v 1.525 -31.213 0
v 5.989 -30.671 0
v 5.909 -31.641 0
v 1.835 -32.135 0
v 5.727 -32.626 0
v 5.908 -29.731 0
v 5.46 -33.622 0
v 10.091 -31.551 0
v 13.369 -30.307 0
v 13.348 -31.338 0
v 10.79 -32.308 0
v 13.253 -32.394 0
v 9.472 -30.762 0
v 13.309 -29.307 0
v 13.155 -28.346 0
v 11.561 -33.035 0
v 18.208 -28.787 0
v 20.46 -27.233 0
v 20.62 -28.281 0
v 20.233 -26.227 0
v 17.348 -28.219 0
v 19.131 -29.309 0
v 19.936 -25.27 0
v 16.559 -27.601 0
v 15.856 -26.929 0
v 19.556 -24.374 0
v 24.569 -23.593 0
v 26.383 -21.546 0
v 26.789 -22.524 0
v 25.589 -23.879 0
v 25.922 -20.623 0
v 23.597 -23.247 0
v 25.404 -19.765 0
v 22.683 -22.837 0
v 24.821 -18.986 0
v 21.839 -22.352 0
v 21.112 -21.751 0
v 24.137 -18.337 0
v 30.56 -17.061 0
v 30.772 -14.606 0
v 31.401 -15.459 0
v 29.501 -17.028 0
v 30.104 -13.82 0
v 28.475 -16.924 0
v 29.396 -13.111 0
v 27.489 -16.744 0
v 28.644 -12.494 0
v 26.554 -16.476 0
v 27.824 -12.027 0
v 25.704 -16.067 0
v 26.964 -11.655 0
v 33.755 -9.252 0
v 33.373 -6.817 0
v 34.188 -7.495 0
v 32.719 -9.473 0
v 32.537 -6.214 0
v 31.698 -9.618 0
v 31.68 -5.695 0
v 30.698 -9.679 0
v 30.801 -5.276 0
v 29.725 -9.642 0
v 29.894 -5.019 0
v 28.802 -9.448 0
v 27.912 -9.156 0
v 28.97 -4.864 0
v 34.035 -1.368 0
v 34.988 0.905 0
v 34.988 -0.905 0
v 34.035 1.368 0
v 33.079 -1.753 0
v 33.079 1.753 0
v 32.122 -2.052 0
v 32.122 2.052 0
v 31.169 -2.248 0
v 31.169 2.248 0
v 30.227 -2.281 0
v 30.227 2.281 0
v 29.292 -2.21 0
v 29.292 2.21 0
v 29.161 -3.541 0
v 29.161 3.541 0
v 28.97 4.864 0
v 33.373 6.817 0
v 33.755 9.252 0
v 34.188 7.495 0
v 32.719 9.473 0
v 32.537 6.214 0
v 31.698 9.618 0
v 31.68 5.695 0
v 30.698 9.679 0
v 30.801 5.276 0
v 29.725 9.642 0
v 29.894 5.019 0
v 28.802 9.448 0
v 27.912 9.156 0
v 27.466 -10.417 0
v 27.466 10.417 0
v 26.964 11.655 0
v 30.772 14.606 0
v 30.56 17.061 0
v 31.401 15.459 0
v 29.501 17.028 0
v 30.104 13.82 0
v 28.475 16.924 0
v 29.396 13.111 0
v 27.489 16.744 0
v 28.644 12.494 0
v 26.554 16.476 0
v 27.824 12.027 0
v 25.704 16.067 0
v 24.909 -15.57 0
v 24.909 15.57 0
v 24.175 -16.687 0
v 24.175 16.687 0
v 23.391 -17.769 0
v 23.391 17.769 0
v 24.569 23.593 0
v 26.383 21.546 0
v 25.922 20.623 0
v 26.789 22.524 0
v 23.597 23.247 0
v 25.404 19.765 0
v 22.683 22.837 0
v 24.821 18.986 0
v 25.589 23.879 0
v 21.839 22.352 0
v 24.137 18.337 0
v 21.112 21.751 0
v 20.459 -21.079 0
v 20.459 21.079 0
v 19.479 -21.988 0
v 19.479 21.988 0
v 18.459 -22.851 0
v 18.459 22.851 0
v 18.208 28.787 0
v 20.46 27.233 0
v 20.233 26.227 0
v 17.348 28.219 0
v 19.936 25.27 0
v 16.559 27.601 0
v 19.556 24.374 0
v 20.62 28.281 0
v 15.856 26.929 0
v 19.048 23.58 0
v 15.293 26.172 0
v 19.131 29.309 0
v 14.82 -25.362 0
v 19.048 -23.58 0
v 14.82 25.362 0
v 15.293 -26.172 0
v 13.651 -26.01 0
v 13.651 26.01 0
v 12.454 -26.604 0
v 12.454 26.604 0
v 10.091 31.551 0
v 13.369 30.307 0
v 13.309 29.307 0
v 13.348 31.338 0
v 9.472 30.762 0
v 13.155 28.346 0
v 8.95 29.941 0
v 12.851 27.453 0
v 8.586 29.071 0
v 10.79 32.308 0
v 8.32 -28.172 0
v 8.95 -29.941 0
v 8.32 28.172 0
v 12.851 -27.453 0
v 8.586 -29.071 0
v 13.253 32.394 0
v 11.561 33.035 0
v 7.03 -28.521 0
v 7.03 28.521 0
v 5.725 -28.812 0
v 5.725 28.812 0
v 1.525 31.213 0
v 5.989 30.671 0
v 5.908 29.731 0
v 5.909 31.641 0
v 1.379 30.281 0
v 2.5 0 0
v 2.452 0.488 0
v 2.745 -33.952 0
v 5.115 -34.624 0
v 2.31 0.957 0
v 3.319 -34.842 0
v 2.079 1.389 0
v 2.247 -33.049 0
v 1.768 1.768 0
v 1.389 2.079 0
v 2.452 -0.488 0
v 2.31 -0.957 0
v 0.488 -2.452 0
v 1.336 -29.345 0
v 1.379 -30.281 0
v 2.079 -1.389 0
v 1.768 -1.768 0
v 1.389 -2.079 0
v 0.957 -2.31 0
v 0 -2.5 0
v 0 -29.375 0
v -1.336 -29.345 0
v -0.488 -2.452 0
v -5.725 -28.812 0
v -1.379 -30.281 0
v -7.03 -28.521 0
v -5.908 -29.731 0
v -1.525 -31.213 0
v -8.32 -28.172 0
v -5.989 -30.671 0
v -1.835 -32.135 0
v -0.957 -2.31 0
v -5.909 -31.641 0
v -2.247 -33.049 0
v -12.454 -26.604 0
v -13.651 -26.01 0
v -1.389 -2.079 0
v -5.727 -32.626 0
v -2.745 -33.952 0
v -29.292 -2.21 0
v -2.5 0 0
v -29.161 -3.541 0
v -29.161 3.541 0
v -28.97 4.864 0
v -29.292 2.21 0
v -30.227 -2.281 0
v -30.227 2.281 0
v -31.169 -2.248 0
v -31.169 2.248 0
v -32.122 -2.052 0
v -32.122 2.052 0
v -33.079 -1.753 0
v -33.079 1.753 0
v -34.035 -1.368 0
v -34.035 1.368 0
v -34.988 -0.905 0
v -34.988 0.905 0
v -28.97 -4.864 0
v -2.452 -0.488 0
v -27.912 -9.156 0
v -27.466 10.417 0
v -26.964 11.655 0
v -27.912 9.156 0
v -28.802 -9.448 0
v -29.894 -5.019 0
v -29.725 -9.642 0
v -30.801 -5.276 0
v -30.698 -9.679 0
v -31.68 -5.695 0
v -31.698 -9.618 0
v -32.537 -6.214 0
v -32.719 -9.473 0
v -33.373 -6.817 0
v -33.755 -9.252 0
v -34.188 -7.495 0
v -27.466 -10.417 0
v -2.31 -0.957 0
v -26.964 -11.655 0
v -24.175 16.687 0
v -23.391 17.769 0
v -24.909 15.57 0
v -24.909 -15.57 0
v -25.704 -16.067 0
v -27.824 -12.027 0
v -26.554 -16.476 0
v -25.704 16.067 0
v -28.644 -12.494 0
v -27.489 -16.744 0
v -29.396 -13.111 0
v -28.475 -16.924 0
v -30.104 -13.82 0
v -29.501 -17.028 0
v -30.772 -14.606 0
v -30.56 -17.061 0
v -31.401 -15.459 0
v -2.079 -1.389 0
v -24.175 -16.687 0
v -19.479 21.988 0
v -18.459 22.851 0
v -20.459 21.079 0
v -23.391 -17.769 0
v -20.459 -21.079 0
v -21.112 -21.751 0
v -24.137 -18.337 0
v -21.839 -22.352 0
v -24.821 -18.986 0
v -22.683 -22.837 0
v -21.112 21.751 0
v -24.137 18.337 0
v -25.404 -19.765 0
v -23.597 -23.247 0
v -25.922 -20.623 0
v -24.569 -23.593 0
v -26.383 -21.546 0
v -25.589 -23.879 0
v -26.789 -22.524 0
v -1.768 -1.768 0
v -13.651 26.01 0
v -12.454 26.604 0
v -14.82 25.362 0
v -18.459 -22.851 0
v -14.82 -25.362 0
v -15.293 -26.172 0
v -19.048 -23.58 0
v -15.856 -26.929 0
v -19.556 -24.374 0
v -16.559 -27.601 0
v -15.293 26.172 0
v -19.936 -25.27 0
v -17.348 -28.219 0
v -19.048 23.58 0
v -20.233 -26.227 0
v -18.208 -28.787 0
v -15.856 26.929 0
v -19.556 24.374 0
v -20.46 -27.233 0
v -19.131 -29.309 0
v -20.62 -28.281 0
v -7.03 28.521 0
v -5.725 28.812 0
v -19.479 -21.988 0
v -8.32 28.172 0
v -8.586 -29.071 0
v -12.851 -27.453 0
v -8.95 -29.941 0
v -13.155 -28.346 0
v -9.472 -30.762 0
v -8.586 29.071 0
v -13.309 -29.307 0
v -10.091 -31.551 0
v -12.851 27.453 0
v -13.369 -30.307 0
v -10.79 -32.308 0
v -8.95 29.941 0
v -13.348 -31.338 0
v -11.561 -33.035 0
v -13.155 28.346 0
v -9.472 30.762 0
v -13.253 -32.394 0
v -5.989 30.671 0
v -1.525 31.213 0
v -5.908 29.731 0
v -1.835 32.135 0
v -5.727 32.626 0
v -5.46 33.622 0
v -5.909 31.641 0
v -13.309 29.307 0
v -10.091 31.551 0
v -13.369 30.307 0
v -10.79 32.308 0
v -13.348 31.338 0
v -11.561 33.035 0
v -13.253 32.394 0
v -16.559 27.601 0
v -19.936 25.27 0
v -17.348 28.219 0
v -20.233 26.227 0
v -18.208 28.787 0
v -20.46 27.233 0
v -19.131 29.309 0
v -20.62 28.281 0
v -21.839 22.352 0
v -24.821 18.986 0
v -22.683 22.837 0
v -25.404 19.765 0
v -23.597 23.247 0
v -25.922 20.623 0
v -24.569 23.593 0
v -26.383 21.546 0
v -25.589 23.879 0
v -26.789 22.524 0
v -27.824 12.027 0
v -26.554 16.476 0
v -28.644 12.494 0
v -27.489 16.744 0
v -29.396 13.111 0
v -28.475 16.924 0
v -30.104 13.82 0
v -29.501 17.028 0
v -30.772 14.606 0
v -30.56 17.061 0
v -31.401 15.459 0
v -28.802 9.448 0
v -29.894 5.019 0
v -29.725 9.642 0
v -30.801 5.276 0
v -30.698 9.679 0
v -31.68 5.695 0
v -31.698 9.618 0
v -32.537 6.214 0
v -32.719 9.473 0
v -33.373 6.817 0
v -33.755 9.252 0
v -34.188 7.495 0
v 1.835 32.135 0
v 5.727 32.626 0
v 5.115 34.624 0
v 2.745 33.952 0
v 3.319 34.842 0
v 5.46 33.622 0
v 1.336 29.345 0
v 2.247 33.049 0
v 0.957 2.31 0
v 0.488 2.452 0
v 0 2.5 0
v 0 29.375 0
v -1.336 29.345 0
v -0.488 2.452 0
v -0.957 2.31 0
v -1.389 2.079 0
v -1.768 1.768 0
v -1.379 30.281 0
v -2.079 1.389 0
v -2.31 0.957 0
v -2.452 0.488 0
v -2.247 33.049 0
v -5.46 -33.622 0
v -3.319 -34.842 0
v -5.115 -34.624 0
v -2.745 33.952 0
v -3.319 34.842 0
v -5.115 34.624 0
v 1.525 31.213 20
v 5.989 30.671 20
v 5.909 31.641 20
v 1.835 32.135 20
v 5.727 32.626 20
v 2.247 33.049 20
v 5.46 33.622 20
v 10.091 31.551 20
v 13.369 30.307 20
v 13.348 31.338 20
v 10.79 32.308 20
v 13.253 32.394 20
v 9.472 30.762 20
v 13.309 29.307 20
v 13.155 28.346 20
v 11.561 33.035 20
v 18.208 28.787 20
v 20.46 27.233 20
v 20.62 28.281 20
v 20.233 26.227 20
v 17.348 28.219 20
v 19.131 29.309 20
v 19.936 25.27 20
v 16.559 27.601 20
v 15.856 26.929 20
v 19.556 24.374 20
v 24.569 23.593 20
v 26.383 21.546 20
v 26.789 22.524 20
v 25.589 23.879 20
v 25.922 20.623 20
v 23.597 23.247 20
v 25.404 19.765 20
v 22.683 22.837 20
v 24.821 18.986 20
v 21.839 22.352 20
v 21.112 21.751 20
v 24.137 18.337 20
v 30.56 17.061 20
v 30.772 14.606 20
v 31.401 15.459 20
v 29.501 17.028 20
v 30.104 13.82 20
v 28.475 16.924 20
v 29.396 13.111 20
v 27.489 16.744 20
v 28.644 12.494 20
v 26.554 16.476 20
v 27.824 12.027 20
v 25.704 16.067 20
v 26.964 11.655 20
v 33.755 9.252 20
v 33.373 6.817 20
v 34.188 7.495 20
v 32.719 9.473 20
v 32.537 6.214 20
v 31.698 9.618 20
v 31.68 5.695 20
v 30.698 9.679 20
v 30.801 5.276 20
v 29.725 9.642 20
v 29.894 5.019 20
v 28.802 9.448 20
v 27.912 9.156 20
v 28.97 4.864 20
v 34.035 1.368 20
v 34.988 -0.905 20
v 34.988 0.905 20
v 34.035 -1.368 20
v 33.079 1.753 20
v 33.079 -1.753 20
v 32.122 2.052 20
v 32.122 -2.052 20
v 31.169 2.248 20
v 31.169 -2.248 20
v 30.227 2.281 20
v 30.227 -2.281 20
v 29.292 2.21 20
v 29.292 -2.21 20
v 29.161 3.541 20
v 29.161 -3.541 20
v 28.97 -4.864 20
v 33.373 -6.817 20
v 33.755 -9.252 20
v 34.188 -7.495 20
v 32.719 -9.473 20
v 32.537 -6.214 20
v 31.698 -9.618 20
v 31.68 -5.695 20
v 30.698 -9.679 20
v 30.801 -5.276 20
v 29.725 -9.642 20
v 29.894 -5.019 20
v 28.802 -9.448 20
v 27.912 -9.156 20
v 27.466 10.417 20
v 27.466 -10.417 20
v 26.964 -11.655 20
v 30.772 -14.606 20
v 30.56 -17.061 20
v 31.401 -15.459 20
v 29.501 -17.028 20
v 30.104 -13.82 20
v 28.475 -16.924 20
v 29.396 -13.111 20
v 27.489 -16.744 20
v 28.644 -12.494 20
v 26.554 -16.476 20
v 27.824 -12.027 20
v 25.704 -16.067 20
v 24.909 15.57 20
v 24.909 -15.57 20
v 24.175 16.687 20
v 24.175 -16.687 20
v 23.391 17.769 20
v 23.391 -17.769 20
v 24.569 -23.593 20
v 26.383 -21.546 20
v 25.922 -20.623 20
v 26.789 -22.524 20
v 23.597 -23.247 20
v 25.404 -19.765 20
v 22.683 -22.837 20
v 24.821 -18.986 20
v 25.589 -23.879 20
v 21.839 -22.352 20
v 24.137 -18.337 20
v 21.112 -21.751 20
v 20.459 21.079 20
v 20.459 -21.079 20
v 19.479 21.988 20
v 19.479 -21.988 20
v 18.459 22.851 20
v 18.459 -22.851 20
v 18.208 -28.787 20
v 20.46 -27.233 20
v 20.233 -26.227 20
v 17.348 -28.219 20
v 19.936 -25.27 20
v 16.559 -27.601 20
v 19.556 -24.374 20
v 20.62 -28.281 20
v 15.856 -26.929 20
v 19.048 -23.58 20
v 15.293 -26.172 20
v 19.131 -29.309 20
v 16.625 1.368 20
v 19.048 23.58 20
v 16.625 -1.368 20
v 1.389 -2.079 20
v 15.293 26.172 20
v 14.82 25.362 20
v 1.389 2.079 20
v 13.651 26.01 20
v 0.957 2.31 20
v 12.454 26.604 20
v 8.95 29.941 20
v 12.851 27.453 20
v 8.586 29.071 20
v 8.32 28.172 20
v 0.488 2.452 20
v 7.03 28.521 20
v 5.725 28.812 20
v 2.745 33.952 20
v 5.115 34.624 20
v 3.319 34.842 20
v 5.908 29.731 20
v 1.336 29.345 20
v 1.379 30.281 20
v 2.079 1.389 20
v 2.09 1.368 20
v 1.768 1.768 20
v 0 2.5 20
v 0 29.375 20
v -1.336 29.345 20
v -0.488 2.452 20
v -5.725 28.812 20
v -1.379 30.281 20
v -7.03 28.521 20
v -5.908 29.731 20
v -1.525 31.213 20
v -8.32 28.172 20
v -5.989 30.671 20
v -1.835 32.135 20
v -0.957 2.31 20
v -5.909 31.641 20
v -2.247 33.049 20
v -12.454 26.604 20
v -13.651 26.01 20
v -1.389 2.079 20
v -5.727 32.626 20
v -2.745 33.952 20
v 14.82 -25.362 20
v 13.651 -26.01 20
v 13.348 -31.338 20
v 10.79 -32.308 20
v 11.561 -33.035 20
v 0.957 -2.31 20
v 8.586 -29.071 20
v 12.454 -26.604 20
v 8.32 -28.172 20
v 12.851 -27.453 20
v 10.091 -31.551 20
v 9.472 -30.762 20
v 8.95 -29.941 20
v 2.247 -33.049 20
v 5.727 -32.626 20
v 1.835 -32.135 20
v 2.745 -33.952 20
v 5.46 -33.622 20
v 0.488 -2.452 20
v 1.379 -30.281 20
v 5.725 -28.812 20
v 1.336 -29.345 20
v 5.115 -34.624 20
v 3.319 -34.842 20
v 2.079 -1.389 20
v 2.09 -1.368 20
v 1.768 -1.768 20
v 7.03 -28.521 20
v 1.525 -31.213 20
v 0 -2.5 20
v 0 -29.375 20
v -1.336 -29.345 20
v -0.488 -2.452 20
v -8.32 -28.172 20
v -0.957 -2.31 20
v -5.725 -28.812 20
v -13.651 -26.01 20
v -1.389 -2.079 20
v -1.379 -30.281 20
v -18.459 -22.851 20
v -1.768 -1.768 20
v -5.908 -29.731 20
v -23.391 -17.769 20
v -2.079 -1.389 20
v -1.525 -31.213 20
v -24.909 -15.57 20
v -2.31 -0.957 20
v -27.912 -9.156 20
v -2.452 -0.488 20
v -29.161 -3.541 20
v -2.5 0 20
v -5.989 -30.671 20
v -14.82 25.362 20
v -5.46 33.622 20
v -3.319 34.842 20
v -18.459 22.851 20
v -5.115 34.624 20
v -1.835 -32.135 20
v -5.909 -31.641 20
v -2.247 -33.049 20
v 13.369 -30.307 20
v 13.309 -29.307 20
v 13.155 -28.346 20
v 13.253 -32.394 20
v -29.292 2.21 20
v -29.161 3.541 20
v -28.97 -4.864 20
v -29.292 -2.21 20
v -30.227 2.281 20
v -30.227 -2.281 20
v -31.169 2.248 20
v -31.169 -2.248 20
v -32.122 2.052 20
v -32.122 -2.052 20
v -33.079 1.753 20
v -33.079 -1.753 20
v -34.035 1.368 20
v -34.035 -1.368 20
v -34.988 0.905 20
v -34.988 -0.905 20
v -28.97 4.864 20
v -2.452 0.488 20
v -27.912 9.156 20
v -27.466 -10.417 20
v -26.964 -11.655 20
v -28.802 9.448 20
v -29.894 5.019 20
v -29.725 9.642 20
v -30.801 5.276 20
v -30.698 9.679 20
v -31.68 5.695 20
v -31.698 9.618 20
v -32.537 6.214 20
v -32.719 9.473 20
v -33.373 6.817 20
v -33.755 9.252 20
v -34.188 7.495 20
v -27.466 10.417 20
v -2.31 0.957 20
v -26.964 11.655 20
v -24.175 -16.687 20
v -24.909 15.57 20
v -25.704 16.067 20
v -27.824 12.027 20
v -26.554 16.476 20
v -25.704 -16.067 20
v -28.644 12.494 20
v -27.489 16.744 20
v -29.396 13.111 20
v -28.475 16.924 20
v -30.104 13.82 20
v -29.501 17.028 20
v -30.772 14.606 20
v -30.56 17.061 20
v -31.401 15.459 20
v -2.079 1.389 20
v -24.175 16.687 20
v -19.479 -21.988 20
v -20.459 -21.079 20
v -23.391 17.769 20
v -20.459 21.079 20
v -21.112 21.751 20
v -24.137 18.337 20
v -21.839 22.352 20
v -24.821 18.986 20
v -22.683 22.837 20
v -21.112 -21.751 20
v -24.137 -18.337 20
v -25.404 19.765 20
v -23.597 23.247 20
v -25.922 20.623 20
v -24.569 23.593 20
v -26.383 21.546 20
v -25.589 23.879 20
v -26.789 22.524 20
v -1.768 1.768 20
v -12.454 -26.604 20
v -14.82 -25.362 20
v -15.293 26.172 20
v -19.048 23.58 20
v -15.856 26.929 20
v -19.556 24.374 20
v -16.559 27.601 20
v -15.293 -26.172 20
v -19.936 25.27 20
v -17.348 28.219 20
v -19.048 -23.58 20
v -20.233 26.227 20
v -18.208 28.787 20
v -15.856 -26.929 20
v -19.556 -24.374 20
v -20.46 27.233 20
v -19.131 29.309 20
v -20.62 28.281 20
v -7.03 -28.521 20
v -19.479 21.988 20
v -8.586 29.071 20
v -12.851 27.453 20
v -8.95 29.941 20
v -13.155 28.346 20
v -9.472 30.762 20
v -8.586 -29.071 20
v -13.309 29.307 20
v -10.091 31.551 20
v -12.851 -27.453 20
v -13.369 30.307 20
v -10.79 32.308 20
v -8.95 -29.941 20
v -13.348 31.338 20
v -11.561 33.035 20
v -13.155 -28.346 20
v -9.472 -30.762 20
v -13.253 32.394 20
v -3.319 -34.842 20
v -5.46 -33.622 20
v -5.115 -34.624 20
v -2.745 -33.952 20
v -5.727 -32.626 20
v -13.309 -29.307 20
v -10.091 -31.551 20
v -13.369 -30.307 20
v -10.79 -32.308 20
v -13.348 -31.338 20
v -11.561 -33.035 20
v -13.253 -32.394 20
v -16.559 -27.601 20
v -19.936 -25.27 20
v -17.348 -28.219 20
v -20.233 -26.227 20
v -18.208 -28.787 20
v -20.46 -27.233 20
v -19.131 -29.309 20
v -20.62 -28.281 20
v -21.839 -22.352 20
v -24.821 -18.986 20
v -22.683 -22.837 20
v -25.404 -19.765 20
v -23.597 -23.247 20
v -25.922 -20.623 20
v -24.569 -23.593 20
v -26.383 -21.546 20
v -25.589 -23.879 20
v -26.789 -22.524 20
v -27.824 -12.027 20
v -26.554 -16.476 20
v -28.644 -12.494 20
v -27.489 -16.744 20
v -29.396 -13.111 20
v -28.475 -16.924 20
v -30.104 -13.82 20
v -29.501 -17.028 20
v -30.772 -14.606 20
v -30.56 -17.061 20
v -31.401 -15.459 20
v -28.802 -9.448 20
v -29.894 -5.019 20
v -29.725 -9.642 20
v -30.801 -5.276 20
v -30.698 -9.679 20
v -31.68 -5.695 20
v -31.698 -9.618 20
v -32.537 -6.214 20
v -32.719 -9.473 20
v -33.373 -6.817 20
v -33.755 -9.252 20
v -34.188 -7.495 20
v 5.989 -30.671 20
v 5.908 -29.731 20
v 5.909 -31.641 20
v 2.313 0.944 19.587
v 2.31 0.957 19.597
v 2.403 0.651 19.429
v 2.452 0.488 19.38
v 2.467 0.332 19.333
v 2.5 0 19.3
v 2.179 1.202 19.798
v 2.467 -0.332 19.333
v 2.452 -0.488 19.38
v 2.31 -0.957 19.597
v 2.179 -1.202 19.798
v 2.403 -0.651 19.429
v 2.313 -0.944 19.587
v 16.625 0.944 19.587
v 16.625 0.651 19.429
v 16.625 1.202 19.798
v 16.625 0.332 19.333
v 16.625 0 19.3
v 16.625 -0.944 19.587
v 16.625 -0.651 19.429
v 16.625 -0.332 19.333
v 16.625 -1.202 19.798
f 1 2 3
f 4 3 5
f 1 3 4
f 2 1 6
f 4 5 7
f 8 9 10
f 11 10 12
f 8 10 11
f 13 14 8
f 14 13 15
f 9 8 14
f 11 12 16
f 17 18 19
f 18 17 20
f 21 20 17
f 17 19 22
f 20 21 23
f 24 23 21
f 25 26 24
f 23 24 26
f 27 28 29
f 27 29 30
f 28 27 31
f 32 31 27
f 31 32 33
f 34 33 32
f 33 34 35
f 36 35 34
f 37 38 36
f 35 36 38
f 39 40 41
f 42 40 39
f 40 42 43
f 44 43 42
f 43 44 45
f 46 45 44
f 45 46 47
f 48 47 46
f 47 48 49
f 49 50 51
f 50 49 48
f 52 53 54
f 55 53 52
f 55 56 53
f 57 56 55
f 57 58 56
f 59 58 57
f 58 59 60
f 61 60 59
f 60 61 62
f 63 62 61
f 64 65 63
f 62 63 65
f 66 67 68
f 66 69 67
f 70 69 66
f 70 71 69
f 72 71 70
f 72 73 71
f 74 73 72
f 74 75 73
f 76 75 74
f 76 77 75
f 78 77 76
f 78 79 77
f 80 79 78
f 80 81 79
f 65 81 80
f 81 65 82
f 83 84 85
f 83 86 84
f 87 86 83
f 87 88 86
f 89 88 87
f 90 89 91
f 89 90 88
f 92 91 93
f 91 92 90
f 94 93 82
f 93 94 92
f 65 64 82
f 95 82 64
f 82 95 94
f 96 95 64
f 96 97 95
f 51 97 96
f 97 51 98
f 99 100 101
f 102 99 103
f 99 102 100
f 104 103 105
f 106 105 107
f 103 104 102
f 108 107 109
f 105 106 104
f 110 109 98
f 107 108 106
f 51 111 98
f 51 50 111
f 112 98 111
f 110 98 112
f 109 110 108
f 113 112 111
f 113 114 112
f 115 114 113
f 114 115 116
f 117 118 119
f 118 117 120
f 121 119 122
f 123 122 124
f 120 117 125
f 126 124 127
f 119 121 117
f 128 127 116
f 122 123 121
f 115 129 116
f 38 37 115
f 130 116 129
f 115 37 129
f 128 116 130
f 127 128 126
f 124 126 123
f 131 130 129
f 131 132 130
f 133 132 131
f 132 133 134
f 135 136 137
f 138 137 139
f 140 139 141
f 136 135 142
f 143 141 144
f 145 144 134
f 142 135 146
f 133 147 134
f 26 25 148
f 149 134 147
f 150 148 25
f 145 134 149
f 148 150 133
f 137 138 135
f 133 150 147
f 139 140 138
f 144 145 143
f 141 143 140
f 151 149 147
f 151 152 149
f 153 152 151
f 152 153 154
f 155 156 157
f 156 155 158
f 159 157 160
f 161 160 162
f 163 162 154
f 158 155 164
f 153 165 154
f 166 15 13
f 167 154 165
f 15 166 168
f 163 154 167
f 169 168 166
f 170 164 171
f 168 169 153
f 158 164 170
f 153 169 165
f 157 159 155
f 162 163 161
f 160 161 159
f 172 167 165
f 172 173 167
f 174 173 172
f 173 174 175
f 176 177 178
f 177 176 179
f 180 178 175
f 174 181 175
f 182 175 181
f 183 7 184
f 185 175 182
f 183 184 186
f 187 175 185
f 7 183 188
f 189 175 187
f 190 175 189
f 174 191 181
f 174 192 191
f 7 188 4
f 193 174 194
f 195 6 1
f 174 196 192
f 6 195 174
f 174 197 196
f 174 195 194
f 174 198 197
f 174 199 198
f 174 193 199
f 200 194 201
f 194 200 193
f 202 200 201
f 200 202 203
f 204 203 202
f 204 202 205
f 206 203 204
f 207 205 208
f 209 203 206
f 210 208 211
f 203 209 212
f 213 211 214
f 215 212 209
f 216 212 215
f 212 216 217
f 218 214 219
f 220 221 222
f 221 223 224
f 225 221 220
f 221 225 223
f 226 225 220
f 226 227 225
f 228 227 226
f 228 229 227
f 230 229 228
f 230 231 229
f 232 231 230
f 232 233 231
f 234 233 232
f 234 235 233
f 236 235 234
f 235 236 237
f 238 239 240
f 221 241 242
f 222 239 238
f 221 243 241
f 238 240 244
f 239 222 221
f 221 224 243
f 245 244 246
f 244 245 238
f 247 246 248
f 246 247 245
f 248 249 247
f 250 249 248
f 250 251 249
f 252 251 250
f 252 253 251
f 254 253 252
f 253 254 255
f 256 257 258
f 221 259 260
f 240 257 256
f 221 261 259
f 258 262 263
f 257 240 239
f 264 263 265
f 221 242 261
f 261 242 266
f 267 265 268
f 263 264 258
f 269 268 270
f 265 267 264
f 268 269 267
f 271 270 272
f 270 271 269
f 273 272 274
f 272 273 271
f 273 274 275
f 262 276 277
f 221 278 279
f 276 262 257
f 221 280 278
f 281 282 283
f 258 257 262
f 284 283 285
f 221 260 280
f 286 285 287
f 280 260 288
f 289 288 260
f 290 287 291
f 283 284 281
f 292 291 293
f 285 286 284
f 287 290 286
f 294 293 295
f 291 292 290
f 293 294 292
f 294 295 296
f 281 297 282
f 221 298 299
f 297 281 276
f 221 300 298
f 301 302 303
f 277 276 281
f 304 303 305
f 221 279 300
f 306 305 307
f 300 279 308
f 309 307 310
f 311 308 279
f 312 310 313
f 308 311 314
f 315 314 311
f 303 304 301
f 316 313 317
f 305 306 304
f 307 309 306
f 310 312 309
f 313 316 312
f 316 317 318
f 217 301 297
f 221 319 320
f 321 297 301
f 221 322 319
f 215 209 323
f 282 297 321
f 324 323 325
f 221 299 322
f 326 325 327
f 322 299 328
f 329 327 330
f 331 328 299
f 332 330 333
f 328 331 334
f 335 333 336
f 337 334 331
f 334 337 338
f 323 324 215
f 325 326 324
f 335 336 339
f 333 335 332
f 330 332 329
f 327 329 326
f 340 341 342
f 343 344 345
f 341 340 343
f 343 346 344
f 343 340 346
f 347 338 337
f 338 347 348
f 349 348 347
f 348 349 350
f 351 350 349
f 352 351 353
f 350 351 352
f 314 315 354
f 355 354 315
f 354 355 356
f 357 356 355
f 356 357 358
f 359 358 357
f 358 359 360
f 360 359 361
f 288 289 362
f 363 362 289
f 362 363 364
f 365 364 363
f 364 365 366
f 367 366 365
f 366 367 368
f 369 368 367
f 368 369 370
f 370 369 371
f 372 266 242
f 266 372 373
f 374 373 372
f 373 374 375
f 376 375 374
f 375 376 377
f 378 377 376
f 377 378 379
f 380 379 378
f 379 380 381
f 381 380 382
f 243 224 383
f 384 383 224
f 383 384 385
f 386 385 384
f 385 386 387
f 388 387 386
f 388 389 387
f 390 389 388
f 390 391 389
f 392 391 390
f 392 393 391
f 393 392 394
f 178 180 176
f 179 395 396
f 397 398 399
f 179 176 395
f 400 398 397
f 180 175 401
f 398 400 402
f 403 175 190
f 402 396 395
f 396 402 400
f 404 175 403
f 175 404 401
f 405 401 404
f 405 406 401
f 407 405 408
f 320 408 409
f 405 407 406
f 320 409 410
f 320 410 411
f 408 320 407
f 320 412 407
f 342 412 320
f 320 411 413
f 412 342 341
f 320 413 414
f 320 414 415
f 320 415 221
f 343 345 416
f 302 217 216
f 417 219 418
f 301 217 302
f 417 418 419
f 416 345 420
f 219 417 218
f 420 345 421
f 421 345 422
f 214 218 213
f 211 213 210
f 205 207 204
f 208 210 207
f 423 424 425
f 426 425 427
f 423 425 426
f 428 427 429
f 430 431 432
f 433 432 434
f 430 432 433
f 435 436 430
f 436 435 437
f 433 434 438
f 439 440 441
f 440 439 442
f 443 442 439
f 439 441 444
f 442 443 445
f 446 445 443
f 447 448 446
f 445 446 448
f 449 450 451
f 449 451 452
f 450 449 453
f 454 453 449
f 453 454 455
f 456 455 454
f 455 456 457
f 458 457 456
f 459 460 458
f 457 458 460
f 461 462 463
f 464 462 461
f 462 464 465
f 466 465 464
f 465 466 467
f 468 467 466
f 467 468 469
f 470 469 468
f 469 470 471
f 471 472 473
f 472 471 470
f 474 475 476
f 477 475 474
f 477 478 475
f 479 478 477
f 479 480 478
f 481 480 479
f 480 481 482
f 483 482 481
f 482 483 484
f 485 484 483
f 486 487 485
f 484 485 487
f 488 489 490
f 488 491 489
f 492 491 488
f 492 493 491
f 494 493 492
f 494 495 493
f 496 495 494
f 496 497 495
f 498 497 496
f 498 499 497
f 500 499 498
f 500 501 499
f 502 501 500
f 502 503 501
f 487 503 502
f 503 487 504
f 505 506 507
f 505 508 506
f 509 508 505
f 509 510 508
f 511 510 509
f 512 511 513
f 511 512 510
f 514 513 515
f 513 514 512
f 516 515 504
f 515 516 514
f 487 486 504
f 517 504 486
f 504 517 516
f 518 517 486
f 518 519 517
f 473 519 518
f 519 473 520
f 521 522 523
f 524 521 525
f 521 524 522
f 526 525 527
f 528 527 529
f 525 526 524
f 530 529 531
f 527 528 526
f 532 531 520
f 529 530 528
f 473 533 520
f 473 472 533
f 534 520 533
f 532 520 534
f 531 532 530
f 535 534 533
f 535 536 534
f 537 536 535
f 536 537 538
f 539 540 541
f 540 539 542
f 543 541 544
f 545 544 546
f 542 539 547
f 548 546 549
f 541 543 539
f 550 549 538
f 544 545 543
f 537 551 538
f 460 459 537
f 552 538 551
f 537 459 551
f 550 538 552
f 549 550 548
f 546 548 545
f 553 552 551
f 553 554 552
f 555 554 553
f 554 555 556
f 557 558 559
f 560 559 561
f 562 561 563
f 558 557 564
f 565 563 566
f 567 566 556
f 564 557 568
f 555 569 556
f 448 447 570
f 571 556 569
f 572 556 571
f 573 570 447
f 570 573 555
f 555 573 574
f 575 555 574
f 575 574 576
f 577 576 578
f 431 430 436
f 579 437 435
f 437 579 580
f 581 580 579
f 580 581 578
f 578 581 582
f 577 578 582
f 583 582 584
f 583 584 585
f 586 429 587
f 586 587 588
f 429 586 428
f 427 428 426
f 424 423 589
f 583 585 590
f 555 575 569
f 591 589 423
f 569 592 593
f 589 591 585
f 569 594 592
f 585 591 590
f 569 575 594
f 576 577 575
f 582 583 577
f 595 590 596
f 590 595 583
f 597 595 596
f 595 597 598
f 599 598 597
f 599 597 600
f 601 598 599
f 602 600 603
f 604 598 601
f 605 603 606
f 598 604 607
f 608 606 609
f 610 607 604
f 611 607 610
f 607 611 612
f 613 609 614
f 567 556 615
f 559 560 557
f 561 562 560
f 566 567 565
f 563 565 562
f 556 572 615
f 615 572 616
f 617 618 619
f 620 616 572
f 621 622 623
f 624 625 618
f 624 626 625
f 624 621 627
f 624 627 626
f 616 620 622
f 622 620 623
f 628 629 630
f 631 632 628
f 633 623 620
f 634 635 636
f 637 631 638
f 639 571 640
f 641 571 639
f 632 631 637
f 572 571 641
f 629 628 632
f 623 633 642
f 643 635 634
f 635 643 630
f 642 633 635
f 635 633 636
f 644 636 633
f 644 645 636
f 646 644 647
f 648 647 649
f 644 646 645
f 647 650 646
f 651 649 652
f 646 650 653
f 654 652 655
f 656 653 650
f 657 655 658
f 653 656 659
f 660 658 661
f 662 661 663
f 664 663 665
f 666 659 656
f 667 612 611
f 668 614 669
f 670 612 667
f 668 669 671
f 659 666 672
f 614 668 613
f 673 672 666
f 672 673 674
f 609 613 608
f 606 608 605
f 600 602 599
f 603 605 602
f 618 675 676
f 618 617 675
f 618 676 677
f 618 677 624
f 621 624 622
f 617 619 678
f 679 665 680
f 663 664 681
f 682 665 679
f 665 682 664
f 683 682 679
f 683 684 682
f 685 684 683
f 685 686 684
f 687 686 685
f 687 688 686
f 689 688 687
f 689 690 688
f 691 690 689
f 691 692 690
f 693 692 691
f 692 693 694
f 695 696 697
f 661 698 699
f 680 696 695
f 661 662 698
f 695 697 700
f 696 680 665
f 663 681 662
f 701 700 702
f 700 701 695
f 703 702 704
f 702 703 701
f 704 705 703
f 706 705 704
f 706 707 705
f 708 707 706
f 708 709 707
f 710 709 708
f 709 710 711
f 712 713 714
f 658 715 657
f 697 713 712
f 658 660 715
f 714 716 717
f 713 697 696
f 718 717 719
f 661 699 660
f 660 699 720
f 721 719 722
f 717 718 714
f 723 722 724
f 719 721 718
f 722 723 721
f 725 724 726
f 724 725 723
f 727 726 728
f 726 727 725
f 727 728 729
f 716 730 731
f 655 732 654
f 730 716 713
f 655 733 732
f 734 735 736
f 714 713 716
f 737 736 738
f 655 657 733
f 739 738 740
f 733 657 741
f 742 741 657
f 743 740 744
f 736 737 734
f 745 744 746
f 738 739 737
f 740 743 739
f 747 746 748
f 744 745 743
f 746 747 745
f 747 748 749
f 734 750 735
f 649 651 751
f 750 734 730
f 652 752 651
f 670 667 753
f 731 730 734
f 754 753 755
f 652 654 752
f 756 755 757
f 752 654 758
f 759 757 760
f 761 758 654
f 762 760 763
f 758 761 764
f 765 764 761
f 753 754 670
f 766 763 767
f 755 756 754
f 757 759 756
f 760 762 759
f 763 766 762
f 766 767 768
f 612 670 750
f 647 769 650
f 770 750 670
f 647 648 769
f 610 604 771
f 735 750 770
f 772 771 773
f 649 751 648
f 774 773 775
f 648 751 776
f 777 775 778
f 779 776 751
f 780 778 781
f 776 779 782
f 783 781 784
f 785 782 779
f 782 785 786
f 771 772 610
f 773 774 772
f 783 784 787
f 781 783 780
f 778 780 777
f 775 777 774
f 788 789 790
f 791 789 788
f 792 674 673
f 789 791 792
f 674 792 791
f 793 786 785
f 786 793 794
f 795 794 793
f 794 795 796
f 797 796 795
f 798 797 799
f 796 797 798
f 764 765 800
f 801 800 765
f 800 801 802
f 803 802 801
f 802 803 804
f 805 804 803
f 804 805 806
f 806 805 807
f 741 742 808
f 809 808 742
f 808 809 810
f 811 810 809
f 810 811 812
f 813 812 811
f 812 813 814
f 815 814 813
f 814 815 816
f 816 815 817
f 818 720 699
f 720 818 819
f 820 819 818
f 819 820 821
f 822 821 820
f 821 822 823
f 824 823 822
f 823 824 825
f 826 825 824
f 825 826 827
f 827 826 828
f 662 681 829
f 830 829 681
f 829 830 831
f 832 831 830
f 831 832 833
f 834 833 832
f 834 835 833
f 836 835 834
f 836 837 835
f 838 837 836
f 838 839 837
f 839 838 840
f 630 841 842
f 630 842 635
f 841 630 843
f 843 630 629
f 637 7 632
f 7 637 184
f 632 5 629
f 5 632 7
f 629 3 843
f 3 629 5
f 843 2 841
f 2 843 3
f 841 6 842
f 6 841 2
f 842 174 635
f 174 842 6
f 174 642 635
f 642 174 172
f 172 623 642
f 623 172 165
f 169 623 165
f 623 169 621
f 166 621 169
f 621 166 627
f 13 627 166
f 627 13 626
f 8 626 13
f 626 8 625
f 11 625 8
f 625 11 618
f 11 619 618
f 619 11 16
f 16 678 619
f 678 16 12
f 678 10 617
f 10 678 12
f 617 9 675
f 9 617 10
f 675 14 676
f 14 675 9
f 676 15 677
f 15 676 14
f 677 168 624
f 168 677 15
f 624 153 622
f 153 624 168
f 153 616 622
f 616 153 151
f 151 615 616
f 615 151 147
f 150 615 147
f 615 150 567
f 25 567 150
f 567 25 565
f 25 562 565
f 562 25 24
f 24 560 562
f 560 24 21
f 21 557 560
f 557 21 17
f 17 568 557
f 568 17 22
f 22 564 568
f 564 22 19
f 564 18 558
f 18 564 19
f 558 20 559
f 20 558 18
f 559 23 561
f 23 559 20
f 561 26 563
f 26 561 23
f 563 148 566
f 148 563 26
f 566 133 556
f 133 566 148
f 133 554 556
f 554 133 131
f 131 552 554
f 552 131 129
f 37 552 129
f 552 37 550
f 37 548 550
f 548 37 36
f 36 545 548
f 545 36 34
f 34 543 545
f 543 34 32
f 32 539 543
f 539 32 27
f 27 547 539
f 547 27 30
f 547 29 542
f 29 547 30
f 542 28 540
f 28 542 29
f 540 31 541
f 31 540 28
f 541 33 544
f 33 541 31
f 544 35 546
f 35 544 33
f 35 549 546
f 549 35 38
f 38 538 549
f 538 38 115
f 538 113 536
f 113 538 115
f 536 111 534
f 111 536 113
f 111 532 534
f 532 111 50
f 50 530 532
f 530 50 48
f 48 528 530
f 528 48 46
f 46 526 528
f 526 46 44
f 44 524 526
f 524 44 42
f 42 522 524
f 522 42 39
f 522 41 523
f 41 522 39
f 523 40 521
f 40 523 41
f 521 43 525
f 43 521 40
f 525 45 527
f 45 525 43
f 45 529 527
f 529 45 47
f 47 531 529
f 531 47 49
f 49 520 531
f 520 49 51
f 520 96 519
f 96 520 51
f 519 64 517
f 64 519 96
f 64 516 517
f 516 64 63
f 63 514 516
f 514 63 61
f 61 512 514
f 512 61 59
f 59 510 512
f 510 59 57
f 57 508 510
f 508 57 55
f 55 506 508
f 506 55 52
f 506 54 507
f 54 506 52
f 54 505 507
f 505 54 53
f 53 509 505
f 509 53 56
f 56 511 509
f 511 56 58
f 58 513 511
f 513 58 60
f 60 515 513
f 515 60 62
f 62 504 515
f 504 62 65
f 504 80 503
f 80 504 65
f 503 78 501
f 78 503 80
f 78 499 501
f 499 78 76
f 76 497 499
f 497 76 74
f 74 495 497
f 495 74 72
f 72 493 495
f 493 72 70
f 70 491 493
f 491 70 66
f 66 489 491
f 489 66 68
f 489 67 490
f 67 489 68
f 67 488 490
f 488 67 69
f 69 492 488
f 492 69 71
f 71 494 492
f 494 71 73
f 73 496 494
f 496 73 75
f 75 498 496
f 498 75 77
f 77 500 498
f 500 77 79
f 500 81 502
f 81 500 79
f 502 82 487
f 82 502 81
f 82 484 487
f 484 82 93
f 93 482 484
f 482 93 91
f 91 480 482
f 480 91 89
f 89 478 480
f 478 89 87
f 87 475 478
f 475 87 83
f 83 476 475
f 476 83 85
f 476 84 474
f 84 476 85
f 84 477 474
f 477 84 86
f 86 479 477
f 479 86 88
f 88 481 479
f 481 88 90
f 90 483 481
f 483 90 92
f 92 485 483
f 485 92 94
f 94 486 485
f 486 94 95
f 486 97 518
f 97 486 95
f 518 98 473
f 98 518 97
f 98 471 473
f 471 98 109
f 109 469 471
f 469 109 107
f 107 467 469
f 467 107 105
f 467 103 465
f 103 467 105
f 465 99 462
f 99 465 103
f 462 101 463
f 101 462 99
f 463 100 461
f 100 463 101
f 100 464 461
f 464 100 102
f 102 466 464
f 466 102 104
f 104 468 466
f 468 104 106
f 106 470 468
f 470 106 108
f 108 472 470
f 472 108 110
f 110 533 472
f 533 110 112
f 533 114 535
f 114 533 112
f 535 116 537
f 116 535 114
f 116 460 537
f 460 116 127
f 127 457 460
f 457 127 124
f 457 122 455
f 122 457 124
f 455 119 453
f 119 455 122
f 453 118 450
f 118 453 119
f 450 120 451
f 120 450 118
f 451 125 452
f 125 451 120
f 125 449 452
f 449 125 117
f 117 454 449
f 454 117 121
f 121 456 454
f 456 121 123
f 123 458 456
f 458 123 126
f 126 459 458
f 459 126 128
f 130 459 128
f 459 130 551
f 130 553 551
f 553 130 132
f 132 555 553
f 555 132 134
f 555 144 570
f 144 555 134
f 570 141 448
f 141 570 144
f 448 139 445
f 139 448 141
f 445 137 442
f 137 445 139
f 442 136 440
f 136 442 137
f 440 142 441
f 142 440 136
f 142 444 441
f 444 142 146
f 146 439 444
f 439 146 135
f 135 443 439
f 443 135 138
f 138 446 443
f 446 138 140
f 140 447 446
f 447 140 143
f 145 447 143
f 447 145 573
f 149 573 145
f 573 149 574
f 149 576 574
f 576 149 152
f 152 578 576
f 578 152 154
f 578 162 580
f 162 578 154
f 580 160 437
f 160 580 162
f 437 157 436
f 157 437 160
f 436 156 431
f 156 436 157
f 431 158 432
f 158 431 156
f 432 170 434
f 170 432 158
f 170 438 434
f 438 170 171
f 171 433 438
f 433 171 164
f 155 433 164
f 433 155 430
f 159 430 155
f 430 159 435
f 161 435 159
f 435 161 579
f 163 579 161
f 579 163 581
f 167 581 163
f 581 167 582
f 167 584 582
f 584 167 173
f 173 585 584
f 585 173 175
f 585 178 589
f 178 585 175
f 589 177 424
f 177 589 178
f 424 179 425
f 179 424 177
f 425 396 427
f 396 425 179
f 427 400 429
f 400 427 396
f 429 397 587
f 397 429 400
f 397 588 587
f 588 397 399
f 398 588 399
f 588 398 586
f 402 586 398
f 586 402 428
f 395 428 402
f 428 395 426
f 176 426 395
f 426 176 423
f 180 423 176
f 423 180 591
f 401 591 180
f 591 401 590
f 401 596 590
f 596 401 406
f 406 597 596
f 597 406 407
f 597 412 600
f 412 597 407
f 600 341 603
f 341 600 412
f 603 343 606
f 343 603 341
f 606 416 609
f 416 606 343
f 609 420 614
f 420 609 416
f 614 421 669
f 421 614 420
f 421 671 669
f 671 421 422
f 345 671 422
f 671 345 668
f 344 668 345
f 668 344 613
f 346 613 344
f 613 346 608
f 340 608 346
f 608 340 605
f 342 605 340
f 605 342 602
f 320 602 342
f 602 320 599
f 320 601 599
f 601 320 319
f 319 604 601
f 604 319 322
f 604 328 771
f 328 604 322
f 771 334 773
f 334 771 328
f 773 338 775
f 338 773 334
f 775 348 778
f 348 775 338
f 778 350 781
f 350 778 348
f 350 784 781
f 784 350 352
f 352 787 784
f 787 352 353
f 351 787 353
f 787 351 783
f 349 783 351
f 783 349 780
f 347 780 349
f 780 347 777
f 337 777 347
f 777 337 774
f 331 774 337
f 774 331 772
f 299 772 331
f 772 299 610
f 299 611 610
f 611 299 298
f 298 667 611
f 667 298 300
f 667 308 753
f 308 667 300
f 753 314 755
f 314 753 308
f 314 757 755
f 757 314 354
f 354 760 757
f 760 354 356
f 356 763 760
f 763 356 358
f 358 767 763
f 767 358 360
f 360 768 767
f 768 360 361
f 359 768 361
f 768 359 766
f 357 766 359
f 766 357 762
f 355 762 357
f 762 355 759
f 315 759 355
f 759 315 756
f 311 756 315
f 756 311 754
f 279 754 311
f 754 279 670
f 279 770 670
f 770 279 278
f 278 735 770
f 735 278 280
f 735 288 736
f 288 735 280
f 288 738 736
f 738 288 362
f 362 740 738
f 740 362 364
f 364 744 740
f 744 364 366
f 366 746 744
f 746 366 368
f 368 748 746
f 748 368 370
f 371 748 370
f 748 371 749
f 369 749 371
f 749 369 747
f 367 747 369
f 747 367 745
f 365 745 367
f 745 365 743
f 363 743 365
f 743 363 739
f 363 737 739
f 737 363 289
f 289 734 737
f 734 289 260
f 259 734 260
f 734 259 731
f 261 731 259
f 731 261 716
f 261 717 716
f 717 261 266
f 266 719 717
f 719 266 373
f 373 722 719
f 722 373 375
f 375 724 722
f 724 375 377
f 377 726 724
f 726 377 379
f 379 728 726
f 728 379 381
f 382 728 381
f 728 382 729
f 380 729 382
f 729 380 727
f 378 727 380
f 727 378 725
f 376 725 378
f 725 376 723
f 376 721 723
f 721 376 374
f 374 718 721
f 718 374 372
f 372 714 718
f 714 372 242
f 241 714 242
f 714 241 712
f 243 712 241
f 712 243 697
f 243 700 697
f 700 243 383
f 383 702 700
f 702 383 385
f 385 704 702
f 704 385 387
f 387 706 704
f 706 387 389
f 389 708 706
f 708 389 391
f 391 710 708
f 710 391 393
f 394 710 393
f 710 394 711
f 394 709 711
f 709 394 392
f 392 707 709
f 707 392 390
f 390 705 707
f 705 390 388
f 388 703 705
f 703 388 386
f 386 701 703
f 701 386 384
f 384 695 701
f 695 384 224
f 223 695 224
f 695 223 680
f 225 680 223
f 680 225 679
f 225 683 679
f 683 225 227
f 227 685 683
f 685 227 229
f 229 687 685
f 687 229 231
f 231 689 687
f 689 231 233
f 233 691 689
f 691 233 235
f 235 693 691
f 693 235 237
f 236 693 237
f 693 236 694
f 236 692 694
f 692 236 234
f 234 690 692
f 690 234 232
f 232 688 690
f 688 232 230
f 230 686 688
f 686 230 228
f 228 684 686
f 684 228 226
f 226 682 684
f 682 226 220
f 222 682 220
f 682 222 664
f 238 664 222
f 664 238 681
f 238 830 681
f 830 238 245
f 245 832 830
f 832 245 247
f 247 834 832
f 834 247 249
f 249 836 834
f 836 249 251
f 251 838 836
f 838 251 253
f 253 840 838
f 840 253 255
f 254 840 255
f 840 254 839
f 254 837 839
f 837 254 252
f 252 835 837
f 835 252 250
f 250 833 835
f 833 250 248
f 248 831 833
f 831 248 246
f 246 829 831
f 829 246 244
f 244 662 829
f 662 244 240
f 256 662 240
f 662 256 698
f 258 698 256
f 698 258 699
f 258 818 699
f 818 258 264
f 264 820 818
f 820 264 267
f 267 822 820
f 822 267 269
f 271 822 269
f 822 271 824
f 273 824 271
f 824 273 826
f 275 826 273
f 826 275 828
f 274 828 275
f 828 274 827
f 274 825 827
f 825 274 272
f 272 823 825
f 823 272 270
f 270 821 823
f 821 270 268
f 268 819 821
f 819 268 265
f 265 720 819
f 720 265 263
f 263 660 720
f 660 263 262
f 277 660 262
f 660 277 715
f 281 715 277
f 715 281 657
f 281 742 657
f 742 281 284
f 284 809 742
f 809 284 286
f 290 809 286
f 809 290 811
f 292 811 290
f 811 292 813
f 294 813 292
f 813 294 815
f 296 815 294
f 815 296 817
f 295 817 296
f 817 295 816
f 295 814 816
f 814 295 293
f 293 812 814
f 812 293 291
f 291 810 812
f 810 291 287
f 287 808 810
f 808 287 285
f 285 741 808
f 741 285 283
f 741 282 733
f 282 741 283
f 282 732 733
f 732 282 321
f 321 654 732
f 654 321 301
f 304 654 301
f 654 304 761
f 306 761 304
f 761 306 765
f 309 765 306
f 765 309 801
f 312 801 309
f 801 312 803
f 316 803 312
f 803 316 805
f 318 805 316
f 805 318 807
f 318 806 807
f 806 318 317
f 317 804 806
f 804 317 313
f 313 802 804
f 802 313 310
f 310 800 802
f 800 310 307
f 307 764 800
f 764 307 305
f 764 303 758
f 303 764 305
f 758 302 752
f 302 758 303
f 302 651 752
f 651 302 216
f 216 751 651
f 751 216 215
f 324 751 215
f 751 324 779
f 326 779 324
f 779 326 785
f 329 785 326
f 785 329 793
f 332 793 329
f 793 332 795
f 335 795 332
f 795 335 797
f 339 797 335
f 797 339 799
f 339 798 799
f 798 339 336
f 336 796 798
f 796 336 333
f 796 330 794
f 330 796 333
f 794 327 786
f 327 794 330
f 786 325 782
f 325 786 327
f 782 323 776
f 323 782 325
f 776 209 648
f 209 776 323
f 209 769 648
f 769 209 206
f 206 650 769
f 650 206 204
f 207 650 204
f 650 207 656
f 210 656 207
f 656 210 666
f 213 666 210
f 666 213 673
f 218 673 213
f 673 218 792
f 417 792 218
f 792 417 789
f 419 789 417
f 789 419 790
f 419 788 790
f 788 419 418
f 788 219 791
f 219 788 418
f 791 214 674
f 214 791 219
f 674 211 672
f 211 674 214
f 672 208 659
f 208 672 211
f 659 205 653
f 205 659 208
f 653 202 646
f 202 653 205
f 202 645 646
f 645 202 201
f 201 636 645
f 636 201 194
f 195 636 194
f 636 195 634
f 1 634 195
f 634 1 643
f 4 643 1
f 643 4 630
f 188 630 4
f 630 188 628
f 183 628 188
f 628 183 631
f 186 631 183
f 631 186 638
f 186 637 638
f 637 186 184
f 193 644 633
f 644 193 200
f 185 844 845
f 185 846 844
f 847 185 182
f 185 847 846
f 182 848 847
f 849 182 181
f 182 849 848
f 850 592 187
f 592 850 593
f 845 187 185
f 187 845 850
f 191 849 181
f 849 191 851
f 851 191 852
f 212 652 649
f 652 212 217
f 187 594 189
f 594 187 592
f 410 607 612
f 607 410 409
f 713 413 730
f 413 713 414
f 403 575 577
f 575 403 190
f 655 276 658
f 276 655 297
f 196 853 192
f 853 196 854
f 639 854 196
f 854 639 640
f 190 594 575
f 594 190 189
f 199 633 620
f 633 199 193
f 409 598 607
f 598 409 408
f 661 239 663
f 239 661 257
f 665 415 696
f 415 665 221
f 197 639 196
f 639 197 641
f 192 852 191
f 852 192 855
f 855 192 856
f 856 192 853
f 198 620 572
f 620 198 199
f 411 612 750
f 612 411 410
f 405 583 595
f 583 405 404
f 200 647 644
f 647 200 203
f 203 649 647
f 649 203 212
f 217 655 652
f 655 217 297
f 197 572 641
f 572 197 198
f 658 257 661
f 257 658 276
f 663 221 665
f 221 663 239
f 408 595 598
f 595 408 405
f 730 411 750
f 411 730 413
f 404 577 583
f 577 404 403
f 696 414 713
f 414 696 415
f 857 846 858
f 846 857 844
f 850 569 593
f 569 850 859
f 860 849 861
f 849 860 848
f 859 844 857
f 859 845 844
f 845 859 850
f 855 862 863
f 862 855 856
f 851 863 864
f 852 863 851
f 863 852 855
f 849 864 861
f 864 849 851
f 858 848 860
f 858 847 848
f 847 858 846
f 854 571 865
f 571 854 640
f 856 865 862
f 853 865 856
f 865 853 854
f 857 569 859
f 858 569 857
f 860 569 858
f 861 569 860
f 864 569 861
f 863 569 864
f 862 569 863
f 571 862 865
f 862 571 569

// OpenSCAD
$fn = 32;

// ----------------------------------------------------------------------
// Spur gear: m=2.5 z=26, 70 mm tip diameter x 20 mm
// ----------------------------------------------------------------------

// --- parameters (mm) ---
modul = 2.5;              // module
n_teeth = 26;             // number of teeth
width = 20;               // face width
pa = 20;                  // pressure angle, deg
shaft_d = 5;              // shaft bore
set_d = 3.4;              // set screw tap hole
set_z = 21;               // set screw height

/* --- involute profile --- */
pitch_r = modul * n_teeth / 2;
base_r = pitch_r * cos(pa);
tip_r = pitch_r + modul;
root_r = pitch_r - 1.25 * modul;
flank_steps = 6;

function inv_deg(a) = (tan(a) - a * PI / 180) * 180 / PI;
function flank_r(i) = root_r + (tip_r - root_r) * i / flank_steps;
function half_angle(r) = 90 / n_teeth + inv_deg(pa) - inv_deg(acos(min(1, base_r / r)));
function tooth_pt(k, i, side) =
    let (r = flank_r(i), a = k * 360 / n_teeth + side * half_angle(r))
    [r * cos(a), r * sin(a)];

module tooth_profile() {
  polygon(points = [
    for (k = [0 : n_teeth - 1])
      each [
        for (i = [0 : flank_steps]) tooth_pt(k, i, -1),
        for (i = [flank_steps : -1 : 0]) tooth_pt(k, i, 1),
        let (ta = (k + 0.5) * 360 / n_teeth)
          [root_r * cos(ta), root_r * sin(ta)]
      ]
  ]);
}

module gear_disc() {
  linear_extrude(height = width) tooth_profile();
}

difference() {
  gear_disc();
  translate([0, 0, -1]) cylinder(h = width + 3, d = shaft_d);
  /* set screw, drilled radially */
  translate([-1, 0, set_z]) rotate([0, 90, 0]) cylinder(h = (root_r * 0.6), d = set_d);
}
